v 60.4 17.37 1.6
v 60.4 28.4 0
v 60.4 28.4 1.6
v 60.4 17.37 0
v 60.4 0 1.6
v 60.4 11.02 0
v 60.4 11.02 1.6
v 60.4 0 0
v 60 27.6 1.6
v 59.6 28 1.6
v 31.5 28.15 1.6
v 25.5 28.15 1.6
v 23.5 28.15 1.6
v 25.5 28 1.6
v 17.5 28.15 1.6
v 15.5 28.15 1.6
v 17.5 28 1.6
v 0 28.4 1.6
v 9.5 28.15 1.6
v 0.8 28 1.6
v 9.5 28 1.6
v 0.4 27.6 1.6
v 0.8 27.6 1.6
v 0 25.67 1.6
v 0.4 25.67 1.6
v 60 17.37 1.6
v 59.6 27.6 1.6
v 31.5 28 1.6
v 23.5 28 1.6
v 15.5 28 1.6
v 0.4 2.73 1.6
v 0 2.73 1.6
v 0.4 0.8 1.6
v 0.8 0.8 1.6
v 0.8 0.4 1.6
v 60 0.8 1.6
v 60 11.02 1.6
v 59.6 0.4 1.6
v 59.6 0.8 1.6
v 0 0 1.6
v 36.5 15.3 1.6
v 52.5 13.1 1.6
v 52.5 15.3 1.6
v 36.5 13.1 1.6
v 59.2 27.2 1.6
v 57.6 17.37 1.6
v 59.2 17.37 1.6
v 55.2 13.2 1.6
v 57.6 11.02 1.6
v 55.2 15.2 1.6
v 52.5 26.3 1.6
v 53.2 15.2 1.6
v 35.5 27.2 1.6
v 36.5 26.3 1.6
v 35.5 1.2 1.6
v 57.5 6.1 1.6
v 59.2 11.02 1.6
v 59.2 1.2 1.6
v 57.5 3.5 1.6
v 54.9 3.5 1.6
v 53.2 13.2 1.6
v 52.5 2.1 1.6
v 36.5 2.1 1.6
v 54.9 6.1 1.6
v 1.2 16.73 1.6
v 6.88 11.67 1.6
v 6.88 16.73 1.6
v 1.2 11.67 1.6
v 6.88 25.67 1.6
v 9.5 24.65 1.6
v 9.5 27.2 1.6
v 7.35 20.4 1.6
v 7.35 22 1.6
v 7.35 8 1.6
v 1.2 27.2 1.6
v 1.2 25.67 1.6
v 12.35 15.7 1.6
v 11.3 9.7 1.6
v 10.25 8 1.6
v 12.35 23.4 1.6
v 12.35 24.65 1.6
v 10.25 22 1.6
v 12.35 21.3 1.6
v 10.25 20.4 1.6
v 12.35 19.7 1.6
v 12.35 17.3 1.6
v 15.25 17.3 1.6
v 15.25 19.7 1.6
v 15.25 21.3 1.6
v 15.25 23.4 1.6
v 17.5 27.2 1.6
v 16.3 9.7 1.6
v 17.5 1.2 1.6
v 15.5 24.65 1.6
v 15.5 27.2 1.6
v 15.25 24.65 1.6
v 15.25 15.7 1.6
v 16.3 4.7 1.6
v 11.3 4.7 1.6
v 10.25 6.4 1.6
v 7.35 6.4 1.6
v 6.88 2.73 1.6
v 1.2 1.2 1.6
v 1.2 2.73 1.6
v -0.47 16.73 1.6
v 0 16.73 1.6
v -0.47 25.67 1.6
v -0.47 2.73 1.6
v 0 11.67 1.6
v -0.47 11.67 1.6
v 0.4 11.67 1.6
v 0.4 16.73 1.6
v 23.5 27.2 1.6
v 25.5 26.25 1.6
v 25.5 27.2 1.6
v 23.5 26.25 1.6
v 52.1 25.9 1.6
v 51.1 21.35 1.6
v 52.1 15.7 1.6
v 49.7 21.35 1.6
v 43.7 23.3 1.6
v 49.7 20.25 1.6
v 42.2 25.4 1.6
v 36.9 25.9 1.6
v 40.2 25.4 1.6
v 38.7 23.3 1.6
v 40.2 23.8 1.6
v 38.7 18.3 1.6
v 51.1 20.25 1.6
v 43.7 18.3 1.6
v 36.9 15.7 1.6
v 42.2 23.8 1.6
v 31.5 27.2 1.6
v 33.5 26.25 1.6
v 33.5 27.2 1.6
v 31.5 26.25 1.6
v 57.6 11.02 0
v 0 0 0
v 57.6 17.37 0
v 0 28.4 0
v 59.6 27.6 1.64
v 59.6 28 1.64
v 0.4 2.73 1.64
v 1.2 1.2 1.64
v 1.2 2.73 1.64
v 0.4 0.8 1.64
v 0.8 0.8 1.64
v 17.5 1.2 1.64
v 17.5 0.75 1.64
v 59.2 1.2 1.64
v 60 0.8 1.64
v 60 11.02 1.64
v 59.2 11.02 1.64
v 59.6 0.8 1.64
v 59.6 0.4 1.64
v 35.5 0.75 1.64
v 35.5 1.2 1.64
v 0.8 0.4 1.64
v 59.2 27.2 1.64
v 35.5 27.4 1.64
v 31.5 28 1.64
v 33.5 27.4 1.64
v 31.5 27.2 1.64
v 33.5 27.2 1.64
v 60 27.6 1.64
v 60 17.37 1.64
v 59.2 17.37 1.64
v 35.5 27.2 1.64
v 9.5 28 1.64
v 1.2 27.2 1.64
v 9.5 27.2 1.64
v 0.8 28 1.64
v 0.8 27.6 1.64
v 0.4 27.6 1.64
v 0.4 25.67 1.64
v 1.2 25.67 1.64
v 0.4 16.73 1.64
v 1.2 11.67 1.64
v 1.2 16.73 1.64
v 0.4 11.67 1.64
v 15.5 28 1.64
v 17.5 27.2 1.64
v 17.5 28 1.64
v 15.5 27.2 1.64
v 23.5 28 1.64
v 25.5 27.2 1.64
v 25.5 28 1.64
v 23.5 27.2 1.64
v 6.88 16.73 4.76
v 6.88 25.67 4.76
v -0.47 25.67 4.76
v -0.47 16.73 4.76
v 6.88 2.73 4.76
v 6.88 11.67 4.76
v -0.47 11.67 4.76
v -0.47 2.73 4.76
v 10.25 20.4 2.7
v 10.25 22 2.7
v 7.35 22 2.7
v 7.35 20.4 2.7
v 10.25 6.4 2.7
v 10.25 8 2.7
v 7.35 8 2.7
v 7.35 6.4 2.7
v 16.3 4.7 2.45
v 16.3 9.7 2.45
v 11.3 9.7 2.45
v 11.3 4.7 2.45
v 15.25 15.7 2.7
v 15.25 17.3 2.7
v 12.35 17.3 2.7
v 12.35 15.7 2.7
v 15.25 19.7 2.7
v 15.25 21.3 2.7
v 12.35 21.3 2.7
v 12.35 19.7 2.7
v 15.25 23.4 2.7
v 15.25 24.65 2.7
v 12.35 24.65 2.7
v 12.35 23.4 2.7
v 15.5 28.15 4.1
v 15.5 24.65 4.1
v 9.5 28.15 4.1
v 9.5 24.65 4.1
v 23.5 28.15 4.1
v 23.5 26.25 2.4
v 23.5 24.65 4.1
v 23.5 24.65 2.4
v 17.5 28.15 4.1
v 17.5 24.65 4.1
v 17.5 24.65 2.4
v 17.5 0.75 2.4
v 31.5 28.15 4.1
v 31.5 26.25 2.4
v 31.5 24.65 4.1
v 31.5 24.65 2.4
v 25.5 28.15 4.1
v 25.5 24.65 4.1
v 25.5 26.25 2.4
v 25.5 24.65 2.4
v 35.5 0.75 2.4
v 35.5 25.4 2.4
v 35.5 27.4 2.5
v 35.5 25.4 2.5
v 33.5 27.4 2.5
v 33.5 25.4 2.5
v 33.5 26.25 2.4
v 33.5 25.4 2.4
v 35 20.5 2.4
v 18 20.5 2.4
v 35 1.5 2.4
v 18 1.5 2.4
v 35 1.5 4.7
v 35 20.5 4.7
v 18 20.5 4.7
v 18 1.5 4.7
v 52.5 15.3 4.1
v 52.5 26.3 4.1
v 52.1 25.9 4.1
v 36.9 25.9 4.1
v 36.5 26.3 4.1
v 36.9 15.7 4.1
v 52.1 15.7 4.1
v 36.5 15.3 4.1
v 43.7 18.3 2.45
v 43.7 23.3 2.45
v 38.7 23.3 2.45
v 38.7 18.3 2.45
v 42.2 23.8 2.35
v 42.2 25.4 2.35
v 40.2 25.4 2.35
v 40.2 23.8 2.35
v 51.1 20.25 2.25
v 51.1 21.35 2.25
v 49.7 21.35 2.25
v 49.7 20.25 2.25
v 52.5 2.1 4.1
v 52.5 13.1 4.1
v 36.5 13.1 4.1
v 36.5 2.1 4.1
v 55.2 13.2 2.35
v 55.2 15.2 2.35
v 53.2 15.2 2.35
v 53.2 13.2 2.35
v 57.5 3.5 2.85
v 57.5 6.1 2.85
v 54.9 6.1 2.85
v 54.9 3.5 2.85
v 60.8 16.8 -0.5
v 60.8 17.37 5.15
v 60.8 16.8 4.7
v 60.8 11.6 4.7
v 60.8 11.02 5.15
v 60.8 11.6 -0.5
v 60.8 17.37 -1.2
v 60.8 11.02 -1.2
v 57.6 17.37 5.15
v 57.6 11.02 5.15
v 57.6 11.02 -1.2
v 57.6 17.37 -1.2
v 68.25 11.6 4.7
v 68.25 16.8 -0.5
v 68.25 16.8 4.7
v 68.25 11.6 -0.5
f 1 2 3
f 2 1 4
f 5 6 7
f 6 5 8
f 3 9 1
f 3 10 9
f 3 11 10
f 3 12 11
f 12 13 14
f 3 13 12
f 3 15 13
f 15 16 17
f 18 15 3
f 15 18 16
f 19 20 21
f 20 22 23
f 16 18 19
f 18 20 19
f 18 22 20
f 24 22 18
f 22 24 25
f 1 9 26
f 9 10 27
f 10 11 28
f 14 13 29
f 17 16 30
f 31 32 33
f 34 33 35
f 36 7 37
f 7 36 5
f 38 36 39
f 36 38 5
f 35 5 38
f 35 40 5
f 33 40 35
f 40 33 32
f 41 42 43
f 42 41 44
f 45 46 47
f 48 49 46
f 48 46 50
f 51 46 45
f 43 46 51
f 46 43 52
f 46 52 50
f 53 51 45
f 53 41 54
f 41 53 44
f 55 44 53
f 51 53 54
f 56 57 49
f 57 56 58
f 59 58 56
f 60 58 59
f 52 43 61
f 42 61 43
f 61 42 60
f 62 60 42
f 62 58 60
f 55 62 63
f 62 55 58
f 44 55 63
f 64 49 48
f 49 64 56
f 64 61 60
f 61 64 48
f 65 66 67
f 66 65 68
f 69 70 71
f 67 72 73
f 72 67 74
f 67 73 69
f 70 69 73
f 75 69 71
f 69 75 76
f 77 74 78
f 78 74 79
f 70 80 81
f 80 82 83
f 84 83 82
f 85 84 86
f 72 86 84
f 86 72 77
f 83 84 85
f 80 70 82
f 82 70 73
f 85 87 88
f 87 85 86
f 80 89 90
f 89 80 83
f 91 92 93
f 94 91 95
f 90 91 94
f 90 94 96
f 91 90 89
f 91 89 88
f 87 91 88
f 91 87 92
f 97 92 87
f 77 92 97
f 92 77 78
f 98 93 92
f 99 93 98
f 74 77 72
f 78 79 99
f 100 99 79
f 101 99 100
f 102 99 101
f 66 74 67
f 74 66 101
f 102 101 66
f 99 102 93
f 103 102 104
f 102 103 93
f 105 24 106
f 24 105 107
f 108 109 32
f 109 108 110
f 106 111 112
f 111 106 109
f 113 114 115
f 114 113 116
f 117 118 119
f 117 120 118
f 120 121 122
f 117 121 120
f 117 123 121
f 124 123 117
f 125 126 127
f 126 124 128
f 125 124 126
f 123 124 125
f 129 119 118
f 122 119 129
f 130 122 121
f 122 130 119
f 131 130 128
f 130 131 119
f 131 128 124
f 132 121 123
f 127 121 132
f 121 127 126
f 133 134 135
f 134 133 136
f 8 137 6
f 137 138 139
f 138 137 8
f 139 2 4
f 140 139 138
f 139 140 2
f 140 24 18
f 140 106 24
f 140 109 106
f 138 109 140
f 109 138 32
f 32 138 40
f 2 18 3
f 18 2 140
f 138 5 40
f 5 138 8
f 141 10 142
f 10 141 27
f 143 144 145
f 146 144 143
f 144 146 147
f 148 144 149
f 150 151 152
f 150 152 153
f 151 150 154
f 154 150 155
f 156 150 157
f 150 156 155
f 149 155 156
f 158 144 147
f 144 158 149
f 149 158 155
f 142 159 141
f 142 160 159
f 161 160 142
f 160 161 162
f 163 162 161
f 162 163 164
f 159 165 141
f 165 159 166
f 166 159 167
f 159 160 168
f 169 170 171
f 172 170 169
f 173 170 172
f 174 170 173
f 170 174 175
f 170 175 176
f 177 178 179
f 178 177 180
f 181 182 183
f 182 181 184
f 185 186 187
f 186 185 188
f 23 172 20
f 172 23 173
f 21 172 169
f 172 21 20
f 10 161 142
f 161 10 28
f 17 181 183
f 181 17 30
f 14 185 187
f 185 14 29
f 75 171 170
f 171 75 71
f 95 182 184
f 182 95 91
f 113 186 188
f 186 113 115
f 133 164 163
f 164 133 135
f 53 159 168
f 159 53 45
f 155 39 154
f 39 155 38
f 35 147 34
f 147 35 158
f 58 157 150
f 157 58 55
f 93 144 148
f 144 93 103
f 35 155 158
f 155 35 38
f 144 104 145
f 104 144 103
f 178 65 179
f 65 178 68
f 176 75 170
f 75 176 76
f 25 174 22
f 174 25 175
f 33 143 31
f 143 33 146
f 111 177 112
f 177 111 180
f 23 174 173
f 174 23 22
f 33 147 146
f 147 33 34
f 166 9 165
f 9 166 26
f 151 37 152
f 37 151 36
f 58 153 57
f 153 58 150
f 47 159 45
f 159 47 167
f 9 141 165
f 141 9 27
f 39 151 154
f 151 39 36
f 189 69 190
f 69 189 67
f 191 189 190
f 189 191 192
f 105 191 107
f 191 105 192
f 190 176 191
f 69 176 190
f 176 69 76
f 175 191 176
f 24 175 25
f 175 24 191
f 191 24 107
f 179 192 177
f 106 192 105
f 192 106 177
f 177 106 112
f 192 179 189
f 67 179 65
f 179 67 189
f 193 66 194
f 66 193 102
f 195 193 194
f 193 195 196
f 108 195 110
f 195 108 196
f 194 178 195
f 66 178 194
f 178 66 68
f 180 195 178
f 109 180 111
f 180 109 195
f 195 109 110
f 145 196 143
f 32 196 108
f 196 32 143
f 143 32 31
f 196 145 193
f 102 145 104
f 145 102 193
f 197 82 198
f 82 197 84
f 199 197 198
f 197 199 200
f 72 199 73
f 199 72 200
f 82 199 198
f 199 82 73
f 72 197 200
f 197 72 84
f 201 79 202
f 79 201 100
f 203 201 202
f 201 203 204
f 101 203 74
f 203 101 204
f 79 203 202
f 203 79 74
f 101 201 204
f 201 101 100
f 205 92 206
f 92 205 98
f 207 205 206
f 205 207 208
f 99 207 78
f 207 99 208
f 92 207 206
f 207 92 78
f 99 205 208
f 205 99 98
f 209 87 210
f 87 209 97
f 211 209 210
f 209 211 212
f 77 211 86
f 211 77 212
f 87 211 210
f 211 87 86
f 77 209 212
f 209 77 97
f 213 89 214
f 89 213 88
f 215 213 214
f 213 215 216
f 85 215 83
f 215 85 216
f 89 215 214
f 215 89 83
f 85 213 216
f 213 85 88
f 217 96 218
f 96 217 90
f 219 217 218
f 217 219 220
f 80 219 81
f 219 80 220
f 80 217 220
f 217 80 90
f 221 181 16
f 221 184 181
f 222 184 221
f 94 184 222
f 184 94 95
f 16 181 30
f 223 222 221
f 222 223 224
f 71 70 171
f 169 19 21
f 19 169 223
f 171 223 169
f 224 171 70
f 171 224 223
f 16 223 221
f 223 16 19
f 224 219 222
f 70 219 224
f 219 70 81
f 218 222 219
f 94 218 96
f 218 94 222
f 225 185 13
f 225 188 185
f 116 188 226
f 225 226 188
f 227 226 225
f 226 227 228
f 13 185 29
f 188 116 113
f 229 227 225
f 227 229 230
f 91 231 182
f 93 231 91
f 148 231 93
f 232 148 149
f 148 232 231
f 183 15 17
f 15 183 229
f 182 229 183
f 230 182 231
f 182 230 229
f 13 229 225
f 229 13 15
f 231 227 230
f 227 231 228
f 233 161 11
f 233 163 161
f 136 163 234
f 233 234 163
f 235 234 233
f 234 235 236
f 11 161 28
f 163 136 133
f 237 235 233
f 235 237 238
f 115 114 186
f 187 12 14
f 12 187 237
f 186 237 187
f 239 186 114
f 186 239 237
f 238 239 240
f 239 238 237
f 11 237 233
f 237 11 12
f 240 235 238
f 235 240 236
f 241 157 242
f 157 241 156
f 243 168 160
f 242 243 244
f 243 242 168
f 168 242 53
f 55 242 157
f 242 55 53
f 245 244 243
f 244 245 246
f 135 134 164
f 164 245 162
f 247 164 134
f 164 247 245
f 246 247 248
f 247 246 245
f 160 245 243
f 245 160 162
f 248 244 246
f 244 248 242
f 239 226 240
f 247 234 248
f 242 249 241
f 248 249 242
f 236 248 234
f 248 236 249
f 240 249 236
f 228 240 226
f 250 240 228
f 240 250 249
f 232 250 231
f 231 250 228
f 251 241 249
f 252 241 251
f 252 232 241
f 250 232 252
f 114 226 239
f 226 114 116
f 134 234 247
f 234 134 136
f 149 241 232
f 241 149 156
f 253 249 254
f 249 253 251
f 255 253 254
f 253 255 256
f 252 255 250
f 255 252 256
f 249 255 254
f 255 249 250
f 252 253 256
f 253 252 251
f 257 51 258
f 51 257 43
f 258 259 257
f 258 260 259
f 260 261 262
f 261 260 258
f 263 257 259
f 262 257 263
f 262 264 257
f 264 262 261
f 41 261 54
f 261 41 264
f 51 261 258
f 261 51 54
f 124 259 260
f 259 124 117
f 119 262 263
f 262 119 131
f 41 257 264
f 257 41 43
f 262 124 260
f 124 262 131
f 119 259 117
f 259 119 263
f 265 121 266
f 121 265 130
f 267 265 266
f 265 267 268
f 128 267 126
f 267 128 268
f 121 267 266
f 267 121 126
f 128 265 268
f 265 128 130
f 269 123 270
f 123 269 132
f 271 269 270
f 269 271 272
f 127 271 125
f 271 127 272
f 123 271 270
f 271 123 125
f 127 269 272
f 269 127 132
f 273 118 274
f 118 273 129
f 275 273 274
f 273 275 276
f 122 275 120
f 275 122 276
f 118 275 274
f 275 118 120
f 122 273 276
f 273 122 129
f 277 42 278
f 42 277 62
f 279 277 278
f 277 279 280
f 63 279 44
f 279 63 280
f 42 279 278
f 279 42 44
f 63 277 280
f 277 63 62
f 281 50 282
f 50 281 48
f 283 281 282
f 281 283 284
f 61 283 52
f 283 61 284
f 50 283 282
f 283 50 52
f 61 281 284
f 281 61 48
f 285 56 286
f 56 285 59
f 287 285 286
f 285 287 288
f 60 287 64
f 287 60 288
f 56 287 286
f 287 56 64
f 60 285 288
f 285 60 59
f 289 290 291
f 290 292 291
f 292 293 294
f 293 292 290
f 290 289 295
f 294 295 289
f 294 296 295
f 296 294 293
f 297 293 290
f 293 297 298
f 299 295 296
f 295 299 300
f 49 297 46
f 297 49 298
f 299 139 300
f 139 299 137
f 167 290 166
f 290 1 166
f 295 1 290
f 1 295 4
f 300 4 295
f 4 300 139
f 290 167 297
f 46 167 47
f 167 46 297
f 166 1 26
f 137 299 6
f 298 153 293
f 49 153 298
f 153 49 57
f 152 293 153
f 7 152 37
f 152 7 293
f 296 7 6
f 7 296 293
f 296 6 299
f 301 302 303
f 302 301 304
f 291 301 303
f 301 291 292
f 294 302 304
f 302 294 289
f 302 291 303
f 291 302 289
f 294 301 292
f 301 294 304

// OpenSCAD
// ============================================================================
// LEXICON DUAL-RF DONGLE DUAL-LR2021 6-LAYER PCBA — PARAMETRIC OPENSCAD 3D MODEL
// Dimensions: 60.40 mm x 28.40 mm x 1.60 mm (Plus Edge-Launch SMA Bulkhead)
// ============================================================================
$fn = 48;
module lexicon_am36_pcba() {
  // PCB_Substrate_6L_FR4_MatteBlack
  color([0.10, 0.12, 0.15]) translate([0.00, 0.00, 0.00]) cube([60.40, 28.40, 1.60]);
  // ENIG_Perimeter_Ring_Top
  color([0.88, 0.72, 0.24]) translate([0.80, 27.20, 1.60]) cube([58.80, 0.80, 0.04]);
  // ENIG_Perimeter_Ring_Bot
  color([0.88, 0.72, 0.24]) translate([0.80, 0.40, 1.60]) cube([58.80, 0.80, 0.04]);
  // ENIG_Perimeter_Ring_Left
  color([0.88, 0.72, 0.24]) translate([0.40, 0.80, 1.60]) cube([0.80, 26.80, 0.04]);
  // ENIG_Perimeter_Ring_Right
  color([0.88, 0.72, 0.24]) translate([59.20, 0.80, 1.60]) cube([0.80, 26.80, 0.04]);
  // J1_USBC_Native_JTAG
  color([0.82, 0.85, 0.88]) translate([-0.47, 16.73, 1.60]) cube([7.35, 8.94, 3.16]);
  // J2_USBC_UART_Bridge
  color([0.82, 0.85, 0.88]) translate([-0.47, 2.73, 1.60]) cube([7.35, 8.94, 3.16]);
  // D1_USBLC6_ESD1
  color([0.16, 0.17, 0.20]) translate([7.35, 20.40, 1.60]) cube([2.90, 1.60, 1.10]);
  // D2_USBLC6_ESD2
  color([0.16, 0.17, 0.20]) translate([7.35, 6.40, 1.60]) cube([2.90, 1.60, 1.10]);
  // U4_CP2102N_QFN28
  color([0.16, 0.17, 0.20]) translate([11.30, 4.70, 1.60]) cube([5.00, 5.00, 0.85]);
  // U5_LDO_3V3_DIG
  color([0.16, 0.17, 0.20]) translate([12.35, 15.70, 1.60]) cube([2.90, 1.60, 1.10]);
  // U6_LDO_3V3_RF0
  color([0.16, 0.17, 0.20]) translate([12.35, 19.70, 1.60]) cube([2.90, 1.60, 1.10]);
  // U7_LDO_3V3_RF1
  color([0.16, 0.17, 0.20]) translate([12.35, 23.40, 1.60]) cube([2.90, 1.60, 1.10]);
  // SW1_RST_Button
  color([0.82, 0.85, 0.88]) translate([9.50, 24.65, 1.60]) cube([6.00, 3.50, 2.50]);
  // SW2_BOOT_Button
  color([0.82, 0.85, 0.88]) translate([17.50, 24.65, 1.60]) cube([6.00, 3.50, 2.50]);
  // SW3_KEY_Button
  color([0.82, 0.85, 0.88]) translate([25.50, 24.65, 1.60]) cube([6.00, 3.50, 2.50]);
  // D5_WS2812B_RGB_LED
  color([0.00, 0.95, 0.75]) translate([33.50, 25.40, 1.60]) cube([2.00, 2.00, 0.90]);
  // U1_ESP32_S3_WROOM_1_Body
  color([0.06, 0.08, 0.10]) translate([17.50, 0.75, 1.60]) cube([18.00, 25.50, 0.80]);
  // U1_ESP32_S3_Shield_Can
  color([0.82, 0.85, 0.88]) translate([18.00, 1.50, 2.40]) cube([17.00, 19.00, 2.30]);
  // SH1_RF0_Shield_Frame_WallN
  color([0.82, 0.85, 0.88]) translate([36.50, 25.90, 1.60]) cube([16.00, 0.40, 2.50]);
  // SH1_RF0_Shield_Frame_WallS
  color([0.82, 0.85, 0.88]) translate([36.50, 15.30, 1.60]) cube([16.00, 0.40, 2.50]);
  // SH1_RF0_Shield_Frame_WallW
  color([0.82, 0.85, 0.88]) translate([36.50, 15.30, 1.60]) cube([0.40, 11.00, 2.50]);
  // SH1_RF0_Shield_Frame_WallE
  color([0.82, 0.85, 0.88]) translate([52.10, 15.30, 1.60]) cube([0.40, 11.00, 2.50]);
  // U2_Semtech_LR2021_RF0
  color([0.16, 0.17, 0.20]) translate([38.70, 18.30, 1.60]) cube([5.00, 5.00, 0.85]);
  // Y1_TCXO_32MHz_RF0
  color([0.88, 0.72, 0.24]) translate([40.20, 23.80, 1.60]) cube([2.00, 1.60, 0.75]);
  // FL1_SAW_915MHz_RF0
  color([0.16, 0.17, 0.20]) translate([49.70, 20.25, 1.60]) cube([1.40, 1.10, 0.65]);
  // SH2_RF1_Shield_Can_Closed
  color([0.82, 0.85, 0.88]) translate([36.50, 2.10, 1.60]) cube([16.00, 11.00, 2.50]);
  // U3_Semtech_LR2021_RF1
  color([0.16, 0.17, 0.20]) translate([38.70, 5.10, 1.60]) cube([5.00, 5.00, 0.85]);
  // Y2_TCXO_32MHz_RF1
  color([0.88, 0.72, 0.24]) translate([40.20, 3.00, 1.60]) cube([2.00, 1.60, 0.75]);
  // FL2_SAW_Diplexer_RF1
  color([0.16, 0.17, 0.20]) translate([49.60, 7.20, 1.60]) cube([1.60, 0.80, 0.65]);
  // U8_SKY13373_RF_Switch
  color([0.16, 0.17, 0.20]) translate([53.20, 13.20, 1.60]) cube([2.00, 2.00, 0.75]);
  // J4_UFL_Aux_Antenna
  color([0.88, 0.72, 0.24]) translate([54.90, 3.50, 1.60]) cube([2.60, 2.60, 1.25]);
  // J3_SMA_Edge_Base
  color([0.88, 0.72, 0.24]) translate([57.60, 11.02, -1.20]) cube([3.20, 6.35, 6.35]);
  // J3_SMA_Threaded_Barrel
  color([0.88, 0.72, 0.24]) translate([60.75, 11.60, -0.50]) cube([7.50, 5.20, 5.20]);
}
lexicon_am36_pcba();
